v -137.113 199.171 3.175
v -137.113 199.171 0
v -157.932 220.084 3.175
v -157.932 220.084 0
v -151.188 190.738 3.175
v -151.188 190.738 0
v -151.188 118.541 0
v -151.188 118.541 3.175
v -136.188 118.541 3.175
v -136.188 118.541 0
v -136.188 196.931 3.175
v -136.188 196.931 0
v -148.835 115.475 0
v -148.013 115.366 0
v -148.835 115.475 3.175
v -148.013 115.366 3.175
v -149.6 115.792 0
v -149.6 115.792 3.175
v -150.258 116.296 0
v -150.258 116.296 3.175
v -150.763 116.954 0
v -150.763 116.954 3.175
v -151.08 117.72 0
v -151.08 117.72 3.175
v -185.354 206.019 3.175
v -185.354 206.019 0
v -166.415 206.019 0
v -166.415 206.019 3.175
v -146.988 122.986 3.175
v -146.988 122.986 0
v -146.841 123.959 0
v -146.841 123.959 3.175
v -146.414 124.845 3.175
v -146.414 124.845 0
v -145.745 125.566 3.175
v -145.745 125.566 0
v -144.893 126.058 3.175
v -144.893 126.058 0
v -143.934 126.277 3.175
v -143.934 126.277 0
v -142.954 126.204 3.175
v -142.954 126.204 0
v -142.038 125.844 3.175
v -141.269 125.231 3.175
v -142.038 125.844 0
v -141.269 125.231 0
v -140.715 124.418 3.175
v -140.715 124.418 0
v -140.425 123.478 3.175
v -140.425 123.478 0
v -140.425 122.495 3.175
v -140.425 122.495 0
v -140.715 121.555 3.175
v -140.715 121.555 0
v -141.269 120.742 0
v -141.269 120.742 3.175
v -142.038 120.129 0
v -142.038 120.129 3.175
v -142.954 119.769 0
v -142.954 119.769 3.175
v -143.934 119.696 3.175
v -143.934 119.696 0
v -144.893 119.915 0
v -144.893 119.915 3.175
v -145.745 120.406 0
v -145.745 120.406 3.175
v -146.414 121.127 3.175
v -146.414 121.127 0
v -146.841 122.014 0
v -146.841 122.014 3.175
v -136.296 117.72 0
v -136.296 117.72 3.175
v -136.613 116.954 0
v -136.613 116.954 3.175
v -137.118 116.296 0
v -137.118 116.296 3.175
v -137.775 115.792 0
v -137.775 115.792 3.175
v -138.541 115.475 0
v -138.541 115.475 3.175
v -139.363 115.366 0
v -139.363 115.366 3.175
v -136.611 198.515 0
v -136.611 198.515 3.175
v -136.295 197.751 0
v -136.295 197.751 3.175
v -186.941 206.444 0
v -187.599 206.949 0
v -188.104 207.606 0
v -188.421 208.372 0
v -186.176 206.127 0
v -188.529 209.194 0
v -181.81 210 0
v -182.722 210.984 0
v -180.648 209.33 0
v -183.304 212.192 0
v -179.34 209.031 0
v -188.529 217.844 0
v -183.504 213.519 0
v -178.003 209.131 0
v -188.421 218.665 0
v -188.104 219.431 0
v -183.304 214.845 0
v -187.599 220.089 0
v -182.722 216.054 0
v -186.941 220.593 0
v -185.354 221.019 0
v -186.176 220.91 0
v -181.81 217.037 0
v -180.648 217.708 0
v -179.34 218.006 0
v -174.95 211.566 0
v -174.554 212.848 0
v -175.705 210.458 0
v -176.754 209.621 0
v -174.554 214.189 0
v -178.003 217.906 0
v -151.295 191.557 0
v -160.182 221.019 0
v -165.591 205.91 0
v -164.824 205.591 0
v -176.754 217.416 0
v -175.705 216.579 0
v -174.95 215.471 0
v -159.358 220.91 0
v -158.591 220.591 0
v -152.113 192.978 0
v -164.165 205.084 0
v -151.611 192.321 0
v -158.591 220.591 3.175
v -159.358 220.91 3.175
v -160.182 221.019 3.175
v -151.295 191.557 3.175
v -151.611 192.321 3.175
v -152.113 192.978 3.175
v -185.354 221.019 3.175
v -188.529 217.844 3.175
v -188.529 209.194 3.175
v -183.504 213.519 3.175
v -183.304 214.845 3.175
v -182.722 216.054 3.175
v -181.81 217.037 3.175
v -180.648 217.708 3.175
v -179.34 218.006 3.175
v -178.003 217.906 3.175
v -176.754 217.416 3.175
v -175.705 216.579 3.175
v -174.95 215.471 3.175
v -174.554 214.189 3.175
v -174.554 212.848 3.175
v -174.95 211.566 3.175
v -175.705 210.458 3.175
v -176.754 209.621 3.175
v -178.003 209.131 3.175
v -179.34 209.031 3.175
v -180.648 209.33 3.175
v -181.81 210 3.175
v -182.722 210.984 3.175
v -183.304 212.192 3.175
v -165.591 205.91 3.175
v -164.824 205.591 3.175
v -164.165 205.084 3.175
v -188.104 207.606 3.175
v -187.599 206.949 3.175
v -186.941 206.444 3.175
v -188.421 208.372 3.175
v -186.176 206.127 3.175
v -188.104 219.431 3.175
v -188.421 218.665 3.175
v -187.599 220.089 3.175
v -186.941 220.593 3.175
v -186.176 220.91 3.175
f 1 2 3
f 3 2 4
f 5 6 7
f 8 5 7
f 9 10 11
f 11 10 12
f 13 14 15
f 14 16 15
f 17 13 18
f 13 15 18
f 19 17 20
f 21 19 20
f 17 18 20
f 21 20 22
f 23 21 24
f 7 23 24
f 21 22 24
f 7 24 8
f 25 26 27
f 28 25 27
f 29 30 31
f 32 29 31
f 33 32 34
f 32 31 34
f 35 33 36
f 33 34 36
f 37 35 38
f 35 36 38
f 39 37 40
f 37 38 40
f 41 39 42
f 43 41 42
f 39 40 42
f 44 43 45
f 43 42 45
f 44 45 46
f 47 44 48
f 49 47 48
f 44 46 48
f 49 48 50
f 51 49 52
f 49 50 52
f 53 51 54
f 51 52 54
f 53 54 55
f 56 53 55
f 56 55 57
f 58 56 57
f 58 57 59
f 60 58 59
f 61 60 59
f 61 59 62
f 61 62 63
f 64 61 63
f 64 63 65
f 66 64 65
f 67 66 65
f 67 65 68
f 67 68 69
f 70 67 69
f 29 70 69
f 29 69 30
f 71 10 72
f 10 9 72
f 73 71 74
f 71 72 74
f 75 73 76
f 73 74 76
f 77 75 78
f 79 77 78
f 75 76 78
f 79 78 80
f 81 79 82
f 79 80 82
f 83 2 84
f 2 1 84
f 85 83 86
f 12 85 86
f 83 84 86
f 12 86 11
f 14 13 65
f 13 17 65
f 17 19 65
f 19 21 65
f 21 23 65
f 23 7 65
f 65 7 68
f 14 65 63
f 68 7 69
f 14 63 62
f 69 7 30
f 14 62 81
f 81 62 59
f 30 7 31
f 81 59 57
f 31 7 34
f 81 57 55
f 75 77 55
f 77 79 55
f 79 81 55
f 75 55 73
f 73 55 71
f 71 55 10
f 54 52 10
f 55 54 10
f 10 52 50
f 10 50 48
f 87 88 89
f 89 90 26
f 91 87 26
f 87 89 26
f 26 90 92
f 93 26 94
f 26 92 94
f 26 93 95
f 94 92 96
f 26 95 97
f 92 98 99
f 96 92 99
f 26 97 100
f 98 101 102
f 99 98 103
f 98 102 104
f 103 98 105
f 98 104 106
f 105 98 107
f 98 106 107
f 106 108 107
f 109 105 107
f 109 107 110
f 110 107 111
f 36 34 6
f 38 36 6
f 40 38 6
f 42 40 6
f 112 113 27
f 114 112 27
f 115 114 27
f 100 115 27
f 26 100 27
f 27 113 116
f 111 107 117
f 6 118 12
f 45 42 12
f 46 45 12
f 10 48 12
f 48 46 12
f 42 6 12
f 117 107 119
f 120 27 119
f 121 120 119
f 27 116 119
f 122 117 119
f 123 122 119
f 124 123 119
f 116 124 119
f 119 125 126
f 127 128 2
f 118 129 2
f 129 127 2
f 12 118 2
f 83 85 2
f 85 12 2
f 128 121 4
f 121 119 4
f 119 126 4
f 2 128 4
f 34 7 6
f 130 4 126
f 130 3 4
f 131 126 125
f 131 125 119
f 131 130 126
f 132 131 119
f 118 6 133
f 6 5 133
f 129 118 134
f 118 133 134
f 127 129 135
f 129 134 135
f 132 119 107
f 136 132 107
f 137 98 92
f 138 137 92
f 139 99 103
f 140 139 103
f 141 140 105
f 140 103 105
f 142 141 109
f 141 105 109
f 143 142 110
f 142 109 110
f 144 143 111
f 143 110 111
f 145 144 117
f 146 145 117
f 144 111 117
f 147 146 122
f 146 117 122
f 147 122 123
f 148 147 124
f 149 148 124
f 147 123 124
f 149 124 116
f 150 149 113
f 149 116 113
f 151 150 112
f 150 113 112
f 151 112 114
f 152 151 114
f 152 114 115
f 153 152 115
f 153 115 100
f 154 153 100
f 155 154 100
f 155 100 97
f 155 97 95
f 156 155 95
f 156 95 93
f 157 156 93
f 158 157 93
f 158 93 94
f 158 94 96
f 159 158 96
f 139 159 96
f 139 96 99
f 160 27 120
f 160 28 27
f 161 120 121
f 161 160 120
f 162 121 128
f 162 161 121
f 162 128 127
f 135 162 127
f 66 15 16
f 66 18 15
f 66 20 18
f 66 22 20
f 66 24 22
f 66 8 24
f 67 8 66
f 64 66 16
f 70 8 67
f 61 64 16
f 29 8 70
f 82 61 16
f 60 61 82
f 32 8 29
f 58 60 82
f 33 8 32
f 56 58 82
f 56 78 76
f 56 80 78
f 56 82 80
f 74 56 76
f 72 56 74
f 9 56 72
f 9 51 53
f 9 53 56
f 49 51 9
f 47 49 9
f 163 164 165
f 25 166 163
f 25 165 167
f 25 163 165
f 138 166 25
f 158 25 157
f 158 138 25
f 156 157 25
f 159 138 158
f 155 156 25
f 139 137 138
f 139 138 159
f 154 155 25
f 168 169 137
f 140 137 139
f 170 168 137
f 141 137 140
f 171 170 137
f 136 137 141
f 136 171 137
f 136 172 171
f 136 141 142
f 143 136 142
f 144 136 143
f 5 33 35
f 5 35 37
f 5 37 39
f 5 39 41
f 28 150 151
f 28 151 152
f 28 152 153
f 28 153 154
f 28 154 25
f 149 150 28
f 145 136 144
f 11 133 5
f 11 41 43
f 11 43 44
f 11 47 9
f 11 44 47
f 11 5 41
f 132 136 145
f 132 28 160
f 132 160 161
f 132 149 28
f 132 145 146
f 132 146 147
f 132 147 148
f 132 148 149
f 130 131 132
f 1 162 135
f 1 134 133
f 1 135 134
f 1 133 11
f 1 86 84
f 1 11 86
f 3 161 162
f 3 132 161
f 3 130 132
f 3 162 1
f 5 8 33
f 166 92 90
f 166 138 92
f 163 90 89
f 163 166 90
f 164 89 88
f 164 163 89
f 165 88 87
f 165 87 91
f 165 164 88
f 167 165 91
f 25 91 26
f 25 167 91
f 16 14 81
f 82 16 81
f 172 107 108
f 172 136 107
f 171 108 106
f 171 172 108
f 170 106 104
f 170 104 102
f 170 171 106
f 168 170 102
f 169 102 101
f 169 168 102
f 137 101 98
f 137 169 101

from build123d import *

# Parameters (mm, degrees)
BOSS_EXTRUDE1_DEPTH  = 3.175
M6_CLEARANCE_HOLE1_D = 6.6
FILLET1_R            = 3.175
M8_CLEARANCE_HOLE1_D = 9


with BuildPart() as part:
    # Sketch2 → Boss-Extrude1 (new body)
    with BuildSketch(Plane.XY):
        Polygon((-136.187872738, 122.986389998), (-136.187872738, 198.242289047), (-158.863157835, 221.01860883), (-179.00393221, 221.01860883), (-188.52893221, 221.01860883), (-188.52893221, 206.01860883), (-179.00393221, 206.01860883), (-151.187872738, 206.01860883), (-151.187872738, 122.986389998), (-151.187872738, 115.366389998), (-136.187872738, 115.366389998), align=None)
        Polygon((-151.187872738, 206.01860883), (-165.095902474, 206.01860883), (-151.187872738, 192.04860883), align=None)
    extrude(amount=BOSS_EXTRUDE1_DEPTH)

    # M6 Clearance Hole1 (through all)
    with Locations(Plane.XY.offset(3.175)):
        with Locations((-143.687872738, 122.986389998)):
            Hole(M6_CLEARANCE_HOLE1_D / 2)

    # Fillet1
    fillet1_edges = [part.edges().sort_by_distance(p)[0] for p in [
        (-188.52893221, 206.01860883, 1.5875),
        (-188.52893221, 221.01860883, 1.5875),
        (-158.863157835, 221.01860883, 1.5875),
        (-136.187872738, 198.242289047, 1.5875),
        (-136.187872738, 115.366389998, 1.5875),
        (-151.187872738, 115.366389998, 1.5875),
        (-151.187872738, 192.04860883, 1.5875),
        (-165.095902474, 206.01860883, 1.5875),
    ]]
    fillet(fillet1_edges, radius=FILLET1_R)

    # M8 Clearance Hole1 (through all)
    with Locations(Plane.XY.offset(3.175)):
        with Locations((-179.00393221, 213.51860883)):
            Hole(M8_CLEARANCE_HOLE1_D / 2)


solid = part.part
